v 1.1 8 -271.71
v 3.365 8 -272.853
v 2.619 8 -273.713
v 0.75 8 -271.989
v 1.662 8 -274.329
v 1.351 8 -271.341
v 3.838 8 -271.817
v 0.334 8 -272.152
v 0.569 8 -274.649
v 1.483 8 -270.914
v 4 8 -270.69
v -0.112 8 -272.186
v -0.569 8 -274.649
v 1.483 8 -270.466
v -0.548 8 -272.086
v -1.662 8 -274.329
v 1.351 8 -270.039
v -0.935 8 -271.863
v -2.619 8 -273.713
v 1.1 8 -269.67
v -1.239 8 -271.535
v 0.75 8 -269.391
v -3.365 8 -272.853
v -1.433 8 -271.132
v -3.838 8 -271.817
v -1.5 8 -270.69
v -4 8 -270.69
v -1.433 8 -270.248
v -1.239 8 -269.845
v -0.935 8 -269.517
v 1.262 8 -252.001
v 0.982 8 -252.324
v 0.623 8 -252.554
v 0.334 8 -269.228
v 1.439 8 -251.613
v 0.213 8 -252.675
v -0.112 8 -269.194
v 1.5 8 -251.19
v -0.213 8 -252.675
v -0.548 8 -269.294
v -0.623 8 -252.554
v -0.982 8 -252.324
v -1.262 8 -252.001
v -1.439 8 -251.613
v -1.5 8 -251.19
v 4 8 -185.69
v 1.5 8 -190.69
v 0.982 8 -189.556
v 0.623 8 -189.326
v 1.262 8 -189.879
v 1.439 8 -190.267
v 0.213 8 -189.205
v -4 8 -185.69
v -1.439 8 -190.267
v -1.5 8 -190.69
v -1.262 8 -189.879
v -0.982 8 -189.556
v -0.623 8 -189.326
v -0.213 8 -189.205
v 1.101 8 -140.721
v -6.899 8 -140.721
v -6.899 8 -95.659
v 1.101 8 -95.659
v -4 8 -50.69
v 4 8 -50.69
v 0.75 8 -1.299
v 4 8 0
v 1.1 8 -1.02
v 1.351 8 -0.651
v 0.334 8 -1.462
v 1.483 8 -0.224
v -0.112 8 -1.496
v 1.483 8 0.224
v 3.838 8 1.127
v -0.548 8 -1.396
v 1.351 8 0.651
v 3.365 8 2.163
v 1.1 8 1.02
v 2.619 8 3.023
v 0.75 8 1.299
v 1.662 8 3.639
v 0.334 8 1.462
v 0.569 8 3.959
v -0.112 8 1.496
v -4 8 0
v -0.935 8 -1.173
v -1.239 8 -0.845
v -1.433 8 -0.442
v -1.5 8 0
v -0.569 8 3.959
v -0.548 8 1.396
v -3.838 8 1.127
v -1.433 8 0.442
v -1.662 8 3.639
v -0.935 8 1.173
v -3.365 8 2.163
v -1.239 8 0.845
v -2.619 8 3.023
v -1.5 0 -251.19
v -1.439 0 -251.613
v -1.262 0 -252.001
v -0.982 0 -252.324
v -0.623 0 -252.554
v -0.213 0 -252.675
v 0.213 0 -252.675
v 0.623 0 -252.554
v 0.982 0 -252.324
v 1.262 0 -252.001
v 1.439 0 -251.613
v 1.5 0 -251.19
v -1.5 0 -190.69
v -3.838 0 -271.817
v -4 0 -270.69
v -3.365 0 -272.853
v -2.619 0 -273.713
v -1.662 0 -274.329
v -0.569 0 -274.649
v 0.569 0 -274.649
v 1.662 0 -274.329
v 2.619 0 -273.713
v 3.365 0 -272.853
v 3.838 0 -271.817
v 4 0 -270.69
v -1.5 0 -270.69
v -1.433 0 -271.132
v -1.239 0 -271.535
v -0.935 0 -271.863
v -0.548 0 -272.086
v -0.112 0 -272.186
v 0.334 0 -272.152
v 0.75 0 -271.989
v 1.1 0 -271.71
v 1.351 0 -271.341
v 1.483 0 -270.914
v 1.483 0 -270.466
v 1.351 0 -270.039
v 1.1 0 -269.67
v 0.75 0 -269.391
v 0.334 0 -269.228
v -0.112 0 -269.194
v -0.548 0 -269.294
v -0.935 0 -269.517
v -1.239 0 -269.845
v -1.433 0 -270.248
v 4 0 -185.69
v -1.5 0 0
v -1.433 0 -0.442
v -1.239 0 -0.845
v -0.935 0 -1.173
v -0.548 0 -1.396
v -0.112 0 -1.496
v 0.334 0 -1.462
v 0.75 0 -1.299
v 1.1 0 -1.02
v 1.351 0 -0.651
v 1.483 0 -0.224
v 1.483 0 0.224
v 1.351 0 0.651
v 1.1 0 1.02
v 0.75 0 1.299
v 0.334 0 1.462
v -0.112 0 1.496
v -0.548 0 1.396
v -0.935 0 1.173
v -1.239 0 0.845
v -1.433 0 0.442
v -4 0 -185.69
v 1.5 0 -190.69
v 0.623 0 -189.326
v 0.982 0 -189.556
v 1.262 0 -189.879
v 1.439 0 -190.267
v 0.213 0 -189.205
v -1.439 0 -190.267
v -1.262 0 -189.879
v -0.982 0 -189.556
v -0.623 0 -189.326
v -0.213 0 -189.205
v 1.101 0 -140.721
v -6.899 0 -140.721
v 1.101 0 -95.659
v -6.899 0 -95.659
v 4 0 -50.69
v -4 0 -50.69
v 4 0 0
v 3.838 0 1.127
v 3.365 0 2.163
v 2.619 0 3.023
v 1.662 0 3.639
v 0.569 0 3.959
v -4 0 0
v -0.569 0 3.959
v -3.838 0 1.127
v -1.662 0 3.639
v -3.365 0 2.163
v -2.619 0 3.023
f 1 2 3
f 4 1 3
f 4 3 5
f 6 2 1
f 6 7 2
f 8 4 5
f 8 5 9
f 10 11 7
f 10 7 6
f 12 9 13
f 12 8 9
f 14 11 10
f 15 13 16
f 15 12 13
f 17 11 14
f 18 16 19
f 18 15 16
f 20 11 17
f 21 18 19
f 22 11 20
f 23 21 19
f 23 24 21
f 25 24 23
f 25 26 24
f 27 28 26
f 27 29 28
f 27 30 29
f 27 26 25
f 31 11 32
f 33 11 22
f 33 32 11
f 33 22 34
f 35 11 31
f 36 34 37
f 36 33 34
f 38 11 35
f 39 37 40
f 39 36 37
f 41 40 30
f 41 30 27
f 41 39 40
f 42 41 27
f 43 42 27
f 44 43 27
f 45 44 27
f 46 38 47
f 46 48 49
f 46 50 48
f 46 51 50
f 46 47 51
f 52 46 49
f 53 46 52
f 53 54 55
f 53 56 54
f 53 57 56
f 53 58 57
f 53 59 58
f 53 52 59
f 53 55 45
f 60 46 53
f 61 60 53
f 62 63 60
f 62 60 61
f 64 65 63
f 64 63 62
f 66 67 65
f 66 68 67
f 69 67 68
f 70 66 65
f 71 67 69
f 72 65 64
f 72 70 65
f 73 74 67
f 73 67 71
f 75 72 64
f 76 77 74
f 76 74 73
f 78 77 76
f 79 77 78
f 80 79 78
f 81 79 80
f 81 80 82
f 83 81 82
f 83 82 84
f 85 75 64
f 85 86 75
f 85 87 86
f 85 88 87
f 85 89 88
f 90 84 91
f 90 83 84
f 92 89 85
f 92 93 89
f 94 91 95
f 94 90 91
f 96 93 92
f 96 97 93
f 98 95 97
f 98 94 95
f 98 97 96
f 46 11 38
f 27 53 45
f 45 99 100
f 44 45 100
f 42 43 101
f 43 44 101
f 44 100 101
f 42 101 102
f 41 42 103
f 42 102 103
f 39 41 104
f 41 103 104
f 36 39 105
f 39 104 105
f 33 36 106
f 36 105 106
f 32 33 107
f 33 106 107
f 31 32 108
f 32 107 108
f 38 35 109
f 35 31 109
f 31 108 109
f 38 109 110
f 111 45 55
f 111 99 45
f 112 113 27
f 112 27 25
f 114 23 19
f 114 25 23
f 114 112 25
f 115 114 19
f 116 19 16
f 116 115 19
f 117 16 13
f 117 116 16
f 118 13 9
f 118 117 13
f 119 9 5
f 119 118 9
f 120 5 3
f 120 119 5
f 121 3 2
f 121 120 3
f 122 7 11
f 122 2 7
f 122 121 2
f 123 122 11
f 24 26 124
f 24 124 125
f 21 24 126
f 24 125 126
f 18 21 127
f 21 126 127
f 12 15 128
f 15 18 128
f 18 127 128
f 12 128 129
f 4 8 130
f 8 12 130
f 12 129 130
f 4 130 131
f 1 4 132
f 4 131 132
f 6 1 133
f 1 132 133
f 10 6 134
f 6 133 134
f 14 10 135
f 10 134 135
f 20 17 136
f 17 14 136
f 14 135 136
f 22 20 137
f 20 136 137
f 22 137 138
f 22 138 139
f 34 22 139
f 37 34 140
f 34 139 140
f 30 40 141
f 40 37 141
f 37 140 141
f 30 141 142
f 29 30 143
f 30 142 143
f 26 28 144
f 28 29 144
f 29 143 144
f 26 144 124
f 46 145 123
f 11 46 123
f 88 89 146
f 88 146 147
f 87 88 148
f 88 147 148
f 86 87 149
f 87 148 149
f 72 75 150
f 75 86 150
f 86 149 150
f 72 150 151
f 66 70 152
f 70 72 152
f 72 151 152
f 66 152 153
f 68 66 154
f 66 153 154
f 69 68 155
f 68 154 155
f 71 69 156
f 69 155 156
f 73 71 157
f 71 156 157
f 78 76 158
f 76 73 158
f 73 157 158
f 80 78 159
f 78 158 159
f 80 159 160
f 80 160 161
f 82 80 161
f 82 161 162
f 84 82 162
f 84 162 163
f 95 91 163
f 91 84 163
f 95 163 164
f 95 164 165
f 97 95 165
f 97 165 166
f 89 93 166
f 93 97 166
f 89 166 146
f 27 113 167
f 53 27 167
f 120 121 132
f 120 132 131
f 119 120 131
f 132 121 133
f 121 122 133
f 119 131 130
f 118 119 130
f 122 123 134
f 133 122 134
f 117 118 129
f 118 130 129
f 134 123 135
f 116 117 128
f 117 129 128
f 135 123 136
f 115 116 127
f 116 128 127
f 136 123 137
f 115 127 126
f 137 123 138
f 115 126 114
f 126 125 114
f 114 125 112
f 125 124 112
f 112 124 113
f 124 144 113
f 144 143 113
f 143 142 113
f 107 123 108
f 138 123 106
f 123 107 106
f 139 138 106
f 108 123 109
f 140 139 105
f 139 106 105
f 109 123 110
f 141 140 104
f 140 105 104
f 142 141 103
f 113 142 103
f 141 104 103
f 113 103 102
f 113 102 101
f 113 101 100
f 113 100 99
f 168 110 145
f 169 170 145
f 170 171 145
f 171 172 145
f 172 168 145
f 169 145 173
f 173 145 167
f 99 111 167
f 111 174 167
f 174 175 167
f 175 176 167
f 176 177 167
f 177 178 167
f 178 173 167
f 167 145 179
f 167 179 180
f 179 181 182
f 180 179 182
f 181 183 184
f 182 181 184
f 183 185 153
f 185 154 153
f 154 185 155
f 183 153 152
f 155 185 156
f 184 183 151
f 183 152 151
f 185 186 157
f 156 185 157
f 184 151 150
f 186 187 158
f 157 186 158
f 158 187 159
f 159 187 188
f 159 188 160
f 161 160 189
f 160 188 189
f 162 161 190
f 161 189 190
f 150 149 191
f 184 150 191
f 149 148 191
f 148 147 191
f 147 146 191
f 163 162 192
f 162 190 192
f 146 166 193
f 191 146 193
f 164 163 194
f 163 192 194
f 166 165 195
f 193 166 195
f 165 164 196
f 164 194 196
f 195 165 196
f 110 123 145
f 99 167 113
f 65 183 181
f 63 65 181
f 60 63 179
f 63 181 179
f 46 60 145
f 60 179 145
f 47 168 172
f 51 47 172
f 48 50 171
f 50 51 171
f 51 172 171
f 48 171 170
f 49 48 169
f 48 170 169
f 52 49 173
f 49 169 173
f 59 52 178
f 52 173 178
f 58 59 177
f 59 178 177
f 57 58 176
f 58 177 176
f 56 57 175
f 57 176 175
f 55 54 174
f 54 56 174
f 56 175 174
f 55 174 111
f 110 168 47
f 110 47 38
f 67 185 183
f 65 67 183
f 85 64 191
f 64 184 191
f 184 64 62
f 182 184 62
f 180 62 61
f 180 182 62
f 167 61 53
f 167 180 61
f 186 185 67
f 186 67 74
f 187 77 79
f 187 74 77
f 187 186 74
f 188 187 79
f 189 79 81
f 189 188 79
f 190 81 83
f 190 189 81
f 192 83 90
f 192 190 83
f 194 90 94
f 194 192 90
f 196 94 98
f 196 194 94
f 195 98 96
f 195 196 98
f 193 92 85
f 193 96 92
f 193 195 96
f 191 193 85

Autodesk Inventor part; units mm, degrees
ref_plane "XZ Plane" through (0, 0, 0) normal (0, 1, 0) x (-1, 0, 0)
ref_plane "XY Plane" through (0, 0, 0) normal (0, 0, 1) x (1, 0, 0)
sketch "Sketch1" plane through (0, 0, 0) normal (0, 1, 0) x (-1, 0, 0)
  line L0 (0, 0) -> (0, -270.69) construction
  line L1 (-4, 0) -> (-4, -270.69)
  line L2 (4, -270.69) -> (4, 0)
  arc A0 (4, 0) -> (-4, 0) centre (0, 0) ccw
  arc A1 (-4, -270.69) -> (4, -270.69) centre (0, -270.69) ccw
  circle A2 centre (0, 0) radius 1.5
  circle A3 centre (0, -270.69) radius 1.5
  line L3 (0, -251.19) -> (0, -190.69) construction
  line L4 (1.5, -251.19) -> (1.5, -190.69)
  line L5 (-1.5, -190.69) -> (-1.5, -251.19)
  arc A4 (-1.5, -251.19) -> (1.5, -251.19) centre (0, -251.19) ccw
  arc A5 (1.5, -190.69) -> (-1.5, -190.69) centre (0, -190.69) ccw
  arc A6 (-4, -185.69) -> (-4, -50.69) centre (-700.7379, -118.19) ccw
  arc A7 (4, -185.69) -> (4, -50.69) centre (-692.7379, -118.19) ccw
  point P0 (0, -135.345)
  point P1 (0, -220.94)
  dimension "d0" = 270.69
  dimension "d1" = 8
  dimension "d2" = 3
  dimension "d3" = 3
  dimension "d10" = 3
  dimension "d11" = 19.5
  dimension "d12" = 80
  dimension "d13" = 85
  dimension "d14" = 220
  dimension "d15" = 700
  dimension "d16" = 700
extrude "Extrusion1" add sketch "Sketch1" along normal blind 8 contours A0 L2 A1 L1 A6 | A7 L2
sketch "Sketch2" plane through (0, 0, 0) normal (0, -1, 0) x (1, 0, 0)
  line L0 (4, 0) -> (4, -50.69) projected
  arc A0 (4, 0) -> (-4, 0) centre (0, 0) ccw projected
  line L1 (-4, -50.69) -> (-4, 0) projected
  arc A1 (-4, -50.69) -> (-4, -185.69) centre (692.7379, -118.19) ccw projected
  line L2 (-4, -270.69) -> (-4, -185.69) projected
  arc A2 (-4, -270.69) -> (4, -270.69) centre (0, -270.69) ccw projected
  line L3 (4, -185.69) -> (4, -270.69) projected
  arc A3 (4, -50.69) -> (4, -185.69) centre (700.7379, -118.19) ccw projected
  circle A4 centre (0, 0) radius 1.5 projected
  circle A5 centre (0, -270.69) radius 1.5 projected
  arc A6 (-1.5, -251.19) -> (1.5, -251.19) centre (0, -251.19) ccw projected
  line L4 (-1.5, -190.69) -> (-1.5, -251.19) projected
  arc A7 (1.5, -190.69) -> (-1.5, -190.69) centre (0, -190.69) ccw projected
  line L5 (1.5, -251.19) -> (1.5, -190.69) projected
